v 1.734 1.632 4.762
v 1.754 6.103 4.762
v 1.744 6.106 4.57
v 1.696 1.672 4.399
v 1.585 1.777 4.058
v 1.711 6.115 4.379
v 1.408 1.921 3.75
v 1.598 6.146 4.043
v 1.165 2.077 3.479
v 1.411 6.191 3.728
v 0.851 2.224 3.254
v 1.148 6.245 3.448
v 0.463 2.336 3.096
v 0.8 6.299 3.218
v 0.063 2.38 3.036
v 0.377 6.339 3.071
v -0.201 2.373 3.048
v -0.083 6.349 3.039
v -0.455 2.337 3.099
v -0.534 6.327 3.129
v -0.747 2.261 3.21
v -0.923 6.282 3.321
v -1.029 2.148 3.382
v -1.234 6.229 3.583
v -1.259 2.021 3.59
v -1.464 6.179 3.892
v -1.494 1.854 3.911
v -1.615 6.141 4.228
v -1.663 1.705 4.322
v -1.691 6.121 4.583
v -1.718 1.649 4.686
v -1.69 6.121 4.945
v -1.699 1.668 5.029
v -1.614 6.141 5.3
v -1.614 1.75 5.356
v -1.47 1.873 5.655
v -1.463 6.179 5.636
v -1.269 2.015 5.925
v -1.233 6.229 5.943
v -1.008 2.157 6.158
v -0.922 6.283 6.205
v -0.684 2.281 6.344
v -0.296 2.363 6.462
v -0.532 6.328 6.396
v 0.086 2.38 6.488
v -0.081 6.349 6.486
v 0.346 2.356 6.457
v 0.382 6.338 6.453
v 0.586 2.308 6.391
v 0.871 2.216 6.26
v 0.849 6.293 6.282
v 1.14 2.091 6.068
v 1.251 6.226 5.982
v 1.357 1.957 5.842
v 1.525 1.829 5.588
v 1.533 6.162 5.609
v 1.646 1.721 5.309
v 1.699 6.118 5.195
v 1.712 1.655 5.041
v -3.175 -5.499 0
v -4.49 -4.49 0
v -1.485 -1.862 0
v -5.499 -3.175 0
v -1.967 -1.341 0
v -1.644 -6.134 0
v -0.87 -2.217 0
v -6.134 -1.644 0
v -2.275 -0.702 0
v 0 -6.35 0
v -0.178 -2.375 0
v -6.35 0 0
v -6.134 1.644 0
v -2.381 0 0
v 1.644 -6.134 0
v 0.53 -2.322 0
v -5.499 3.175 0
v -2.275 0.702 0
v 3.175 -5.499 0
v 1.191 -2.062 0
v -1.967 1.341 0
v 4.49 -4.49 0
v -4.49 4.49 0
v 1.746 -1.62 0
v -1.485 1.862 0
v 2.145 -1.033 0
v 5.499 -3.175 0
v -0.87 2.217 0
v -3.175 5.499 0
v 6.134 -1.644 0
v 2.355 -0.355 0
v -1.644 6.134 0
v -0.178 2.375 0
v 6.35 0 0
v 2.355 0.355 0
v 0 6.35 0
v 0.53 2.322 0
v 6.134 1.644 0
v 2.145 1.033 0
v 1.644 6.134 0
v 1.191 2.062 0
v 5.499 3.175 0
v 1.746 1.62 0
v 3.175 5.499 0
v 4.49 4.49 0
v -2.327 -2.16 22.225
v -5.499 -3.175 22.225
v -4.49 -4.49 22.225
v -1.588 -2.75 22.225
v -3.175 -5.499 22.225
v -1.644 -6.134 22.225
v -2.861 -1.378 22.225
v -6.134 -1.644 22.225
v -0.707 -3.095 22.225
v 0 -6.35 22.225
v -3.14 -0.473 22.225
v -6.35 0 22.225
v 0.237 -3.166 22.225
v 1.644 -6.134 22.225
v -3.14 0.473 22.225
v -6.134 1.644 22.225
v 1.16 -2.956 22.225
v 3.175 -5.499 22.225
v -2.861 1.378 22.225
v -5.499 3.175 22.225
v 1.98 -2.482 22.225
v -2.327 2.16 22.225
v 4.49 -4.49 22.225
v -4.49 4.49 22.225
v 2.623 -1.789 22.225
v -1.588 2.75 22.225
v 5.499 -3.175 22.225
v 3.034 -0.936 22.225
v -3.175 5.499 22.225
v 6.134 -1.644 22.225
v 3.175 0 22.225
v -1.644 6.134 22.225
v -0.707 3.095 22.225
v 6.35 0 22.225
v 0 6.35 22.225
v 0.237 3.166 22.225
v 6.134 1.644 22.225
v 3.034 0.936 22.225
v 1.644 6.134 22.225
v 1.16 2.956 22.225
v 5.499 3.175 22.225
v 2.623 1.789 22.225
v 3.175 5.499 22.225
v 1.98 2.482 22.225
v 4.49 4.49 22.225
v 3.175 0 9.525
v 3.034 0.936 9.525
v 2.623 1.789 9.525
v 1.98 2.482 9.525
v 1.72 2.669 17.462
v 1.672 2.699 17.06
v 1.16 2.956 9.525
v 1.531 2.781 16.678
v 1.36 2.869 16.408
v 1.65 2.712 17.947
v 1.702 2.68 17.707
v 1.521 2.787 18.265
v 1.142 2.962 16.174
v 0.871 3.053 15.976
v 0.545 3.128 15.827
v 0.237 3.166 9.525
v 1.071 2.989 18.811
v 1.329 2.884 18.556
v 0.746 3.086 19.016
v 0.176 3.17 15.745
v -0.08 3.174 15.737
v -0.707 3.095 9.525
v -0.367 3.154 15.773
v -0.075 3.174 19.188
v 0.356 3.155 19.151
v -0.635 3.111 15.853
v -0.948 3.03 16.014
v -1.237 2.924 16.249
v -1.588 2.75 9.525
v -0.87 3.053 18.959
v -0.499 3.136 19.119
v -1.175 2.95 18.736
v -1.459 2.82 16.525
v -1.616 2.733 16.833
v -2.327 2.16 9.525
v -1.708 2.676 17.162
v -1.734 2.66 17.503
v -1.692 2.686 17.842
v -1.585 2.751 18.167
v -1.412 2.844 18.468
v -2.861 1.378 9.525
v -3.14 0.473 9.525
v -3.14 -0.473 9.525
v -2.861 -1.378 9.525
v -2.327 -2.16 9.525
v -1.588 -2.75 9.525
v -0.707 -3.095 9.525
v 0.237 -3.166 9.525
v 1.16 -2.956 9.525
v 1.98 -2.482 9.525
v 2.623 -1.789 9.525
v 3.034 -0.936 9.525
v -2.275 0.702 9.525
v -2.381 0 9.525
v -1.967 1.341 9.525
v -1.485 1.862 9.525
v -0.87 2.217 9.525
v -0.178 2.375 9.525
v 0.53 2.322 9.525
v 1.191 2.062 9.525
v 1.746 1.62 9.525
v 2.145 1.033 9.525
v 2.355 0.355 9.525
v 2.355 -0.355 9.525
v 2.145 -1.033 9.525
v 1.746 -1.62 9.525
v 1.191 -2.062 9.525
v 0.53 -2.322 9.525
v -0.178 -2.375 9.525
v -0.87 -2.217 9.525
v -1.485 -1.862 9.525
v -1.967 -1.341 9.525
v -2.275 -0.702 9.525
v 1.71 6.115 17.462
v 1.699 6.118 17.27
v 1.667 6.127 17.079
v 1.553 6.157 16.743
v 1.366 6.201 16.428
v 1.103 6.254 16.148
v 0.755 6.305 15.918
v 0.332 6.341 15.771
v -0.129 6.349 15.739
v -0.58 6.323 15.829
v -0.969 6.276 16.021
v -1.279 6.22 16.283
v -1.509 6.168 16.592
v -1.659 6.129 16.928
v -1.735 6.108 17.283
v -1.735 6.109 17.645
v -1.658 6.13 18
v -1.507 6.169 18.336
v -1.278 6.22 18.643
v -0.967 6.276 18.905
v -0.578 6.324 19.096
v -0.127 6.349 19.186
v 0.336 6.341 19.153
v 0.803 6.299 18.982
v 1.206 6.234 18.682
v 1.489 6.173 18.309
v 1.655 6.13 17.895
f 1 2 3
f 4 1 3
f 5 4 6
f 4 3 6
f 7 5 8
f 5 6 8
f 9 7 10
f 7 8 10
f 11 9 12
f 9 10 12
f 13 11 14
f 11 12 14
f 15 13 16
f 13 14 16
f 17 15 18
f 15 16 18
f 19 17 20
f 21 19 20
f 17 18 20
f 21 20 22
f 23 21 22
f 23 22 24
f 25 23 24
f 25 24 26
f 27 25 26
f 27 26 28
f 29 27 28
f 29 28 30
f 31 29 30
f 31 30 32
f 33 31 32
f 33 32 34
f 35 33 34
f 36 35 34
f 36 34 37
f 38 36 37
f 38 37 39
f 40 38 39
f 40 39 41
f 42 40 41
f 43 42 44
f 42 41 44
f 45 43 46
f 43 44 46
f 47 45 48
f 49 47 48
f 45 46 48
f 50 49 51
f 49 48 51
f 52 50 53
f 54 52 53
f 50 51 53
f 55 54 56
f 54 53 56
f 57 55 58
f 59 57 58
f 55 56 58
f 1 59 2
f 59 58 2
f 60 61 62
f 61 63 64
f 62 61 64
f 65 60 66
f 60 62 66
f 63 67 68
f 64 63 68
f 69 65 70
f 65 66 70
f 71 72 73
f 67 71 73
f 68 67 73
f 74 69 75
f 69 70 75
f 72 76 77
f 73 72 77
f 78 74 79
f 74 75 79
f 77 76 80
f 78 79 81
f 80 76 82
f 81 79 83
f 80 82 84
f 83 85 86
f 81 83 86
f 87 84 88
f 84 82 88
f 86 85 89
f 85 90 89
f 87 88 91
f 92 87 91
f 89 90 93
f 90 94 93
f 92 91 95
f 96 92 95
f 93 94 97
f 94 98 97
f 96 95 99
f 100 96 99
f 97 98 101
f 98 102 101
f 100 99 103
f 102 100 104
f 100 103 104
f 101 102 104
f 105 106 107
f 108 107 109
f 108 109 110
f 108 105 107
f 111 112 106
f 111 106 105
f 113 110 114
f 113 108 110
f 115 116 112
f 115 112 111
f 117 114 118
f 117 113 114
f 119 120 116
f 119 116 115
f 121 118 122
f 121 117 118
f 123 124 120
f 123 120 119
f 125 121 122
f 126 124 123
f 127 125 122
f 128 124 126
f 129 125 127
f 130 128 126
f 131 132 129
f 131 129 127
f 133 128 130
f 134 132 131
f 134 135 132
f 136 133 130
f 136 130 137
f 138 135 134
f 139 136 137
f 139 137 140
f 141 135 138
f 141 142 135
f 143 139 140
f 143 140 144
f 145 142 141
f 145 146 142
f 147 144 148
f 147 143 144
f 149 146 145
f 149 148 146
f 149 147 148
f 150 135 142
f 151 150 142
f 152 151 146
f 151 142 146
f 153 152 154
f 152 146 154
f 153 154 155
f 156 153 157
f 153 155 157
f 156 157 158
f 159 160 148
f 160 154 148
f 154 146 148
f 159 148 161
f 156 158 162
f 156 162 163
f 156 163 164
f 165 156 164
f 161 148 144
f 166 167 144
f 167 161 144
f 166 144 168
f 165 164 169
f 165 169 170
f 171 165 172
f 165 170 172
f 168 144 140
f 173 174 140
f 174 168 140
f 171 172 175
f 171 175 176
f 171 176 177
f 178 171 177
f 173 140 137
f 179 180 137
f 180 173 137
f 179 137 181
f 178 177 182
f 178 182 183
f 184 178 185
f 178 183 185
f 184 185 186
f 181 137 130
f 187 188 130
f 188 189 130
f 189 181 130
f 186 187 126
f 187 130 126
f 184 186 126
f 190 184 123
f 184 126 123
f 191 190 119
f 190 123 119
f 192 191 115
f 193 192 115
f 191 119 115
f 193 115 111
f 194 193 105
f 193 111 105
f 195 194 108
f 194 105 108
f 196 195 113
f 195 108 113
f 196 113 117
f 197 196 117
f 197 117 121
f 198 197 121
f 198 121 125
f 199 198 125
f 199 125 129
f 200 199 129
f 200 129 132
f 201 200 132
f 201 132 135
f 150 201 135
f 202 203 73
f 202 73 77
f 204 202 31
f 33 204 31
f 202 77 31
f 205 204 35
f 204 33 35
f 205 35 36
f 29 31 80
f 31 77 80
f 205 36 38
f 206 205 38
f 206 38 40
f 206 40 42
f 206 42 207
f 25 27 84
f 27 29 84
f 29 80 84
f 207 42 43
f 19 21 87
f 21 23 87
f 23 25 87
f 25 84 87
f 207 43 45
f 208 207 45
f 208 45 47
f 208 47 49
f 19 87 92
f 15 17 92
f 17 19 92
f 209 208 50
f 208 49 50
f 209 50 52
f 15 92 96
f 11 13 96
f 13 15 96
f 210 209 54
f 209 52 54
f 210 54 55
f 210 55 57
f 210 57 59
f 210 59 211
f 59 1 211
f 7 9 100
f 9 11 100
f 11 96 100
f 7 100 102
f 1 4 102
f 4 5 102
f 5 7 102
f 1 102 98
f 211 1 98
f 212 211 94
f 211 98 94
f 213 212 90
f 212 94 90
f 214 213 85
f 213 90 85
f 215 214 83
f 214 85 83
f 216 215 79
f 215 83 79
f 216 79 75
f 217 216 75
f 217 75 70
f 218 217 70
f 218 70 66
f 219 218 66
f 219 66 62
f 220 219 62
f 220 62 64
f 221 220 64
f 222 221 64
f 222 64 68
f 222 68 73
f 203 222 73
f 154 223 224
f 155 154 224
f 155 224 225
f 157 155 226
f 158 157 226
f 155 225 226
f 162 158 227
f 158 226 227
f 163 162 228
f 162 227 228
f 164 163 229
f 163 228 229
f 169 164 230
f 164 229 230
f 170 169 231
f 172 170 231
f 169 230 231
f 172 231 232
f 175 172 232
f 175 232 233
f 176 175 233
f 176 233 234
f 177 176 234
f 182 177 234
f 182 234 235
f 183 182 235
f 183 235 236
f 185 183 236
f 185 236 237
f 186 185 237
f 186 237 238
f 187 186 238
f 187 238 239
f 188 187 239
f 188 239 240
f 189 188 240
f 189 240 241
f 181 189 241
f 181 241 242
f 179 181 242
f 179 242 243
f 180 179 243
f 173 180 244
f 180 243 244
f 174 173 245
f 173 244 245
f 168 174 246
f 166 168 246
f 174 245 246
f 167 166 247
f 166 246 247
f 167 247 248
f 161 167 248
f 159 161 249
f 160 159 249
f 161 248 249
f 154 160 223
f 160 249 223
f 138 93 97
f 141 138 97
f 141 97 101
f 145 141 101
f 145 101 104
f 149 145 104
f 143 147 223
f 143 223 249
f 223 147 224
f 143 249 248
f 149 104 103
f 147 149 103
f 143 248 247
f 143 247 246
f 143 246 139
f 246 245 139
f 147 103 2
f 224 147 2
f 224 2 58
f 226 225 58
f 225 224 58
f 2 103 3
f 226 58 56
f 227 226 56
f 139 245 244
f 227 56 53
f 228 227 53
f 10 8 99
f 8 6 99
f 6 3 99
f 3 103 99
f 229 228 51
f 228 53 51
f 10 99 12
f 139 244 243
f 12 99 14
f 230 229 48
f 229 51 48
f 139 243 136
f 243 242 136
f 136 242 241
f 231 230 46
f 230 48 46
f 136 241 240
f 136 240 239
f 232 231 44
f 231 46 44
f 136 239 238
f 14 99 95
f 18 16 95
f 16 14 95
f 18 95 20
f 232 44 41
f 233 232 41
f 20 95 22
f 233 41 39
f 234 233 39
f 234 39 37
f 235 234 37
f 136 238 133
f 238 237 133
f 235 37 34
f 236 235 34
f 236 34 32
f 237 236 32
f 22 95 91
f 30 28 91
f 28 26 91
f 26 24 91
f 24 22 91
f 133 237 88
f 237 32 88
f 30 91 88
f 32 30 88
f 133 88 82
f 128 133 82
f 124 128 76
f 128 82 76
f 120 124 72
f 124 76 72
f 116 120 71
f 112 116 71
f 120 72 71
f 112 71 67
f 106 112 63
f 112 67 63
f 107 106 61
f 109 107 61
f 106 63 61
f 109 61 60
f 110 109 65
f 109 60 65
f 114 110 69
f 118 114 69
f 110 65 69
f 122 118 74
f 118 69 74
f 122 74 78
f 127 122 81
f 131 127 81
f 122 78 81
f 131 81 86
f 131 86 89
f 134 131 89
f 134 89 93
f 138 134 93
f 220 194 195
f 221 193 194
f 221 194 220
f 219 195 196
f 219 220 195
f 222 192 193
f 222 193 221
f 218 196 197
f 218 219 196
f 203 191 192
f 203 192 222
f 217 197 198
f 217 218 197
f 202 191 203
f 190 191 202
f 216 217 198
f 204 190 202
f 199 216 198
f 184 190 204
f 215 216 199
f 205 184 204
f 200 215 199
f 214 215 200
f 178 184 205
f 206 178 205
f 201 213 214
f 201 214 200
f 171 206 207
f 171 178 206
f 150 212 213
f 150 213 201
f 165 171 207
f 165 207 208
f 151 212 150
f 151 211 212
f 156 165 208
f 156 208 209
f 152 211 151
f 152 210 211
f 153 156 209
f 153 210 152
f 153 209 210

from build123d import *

# Parameters (mm, degrees)
SKETCH1_R                           = 6.35
BOSS_EXTRUDE1_DEPTH                 = 22.225
SKETCH2_R                           = 3.175
THICK_DEPTH                         = 12.7
SKETCH3_R                           = 2.38125
THIN_DEPTH                          = 12.7
F_8_32_TAPPED_HOLE2_REACH           = 24.512
F_8_32_TAPPED_HOLE2_BORE_R          = 1.7272
F_8_32_TAPPED_HOLE2_ON_FACE_2_REACH = 24.515
F_8_32_TAPPED_HOLE2_BORE_2_R        = 1.7272


with BuildPart() as part:
    # Sketch1 → Boss-Extrude1 (new body)
    with BuildSketch(Plane.XY):
        Circle(SKETCH1_R)
    extrude(amount=BOSS_EXTRUDE1_DEPTH)

    # Sketch2 → Thick (cut)
    with BuildSketch(Plane.XY.offset(22.225)):
        Circle(SKETCH2_R)
    extrude(amount=-THICK_DEPTH, mode=Mode.SUBTRACT)

    # Sketch3 → Thin (cut)
    with BuildSketch(Plane(origin=(0, 0, 0), x_dir=(-1, 0, 0), z_dir=(0, 0, -1))):
        Circle(SKETCH3_R)
    extrude(amount=-THIN_DEPTH, mode=Mode.SUBTRACT)

    # #8-32 Tapped Hole2 bore (on position points) → #8-32 Tapped Hole2 (cut, up to next)
    with BuildSketch(Plane(origin=(-0.017626293, 6.349975536, 17.4625), x_dir=(0.999996147476, 0.002775794184, 0), z_dir=(-0.002775794184, 0.999996147476, 0)), mode=Mode.PRIVATE) as f_8_32_tapped_hole2_sk1:
        Circle(F_8_32_TAPPED_HOLE2_BORE_R)
    f_8_32_tapped_hole2_tool1 = extrude(f_8_32_tapped_hole2_sk1.sketch, amount=-F_8_32_TAPPED_HOLE2_REACH, mode=Mode.PRIVATE) & part.part
    add(f_8_32_tapped_hole2_tool1.solids().sort_by_distance((-0.017626, 6.349976, 17.4625))[0], mode=Mode.SUBTRACT)

    # #8-32 Tapped Hole2 bore 2 (on position points) → #8-32 Tapped Hole2 on face 2 (cut, up to next)
    with BuildSketch(Plane(origin=(0.028231467, 6.349937243, 4.7625), x_dir=(0.999990116491, -0.004446000518, 0), z_dir=(0.004446000518, 0.999990116491, 0)), mode=Mode.PRIVATE) as f_8_32_tapped_hole2_on_face_2_sk1:
        Circle(F_8_32_TAPPED_HOLE2_BORE_2_R)
    f_8_32_tapped_hole2_on_face_2_tool1 = extrude(f_8_32_tapped_hole2_on_face_2_sk1.sketch, amount=-F_8_32_TAPPED_HOLE2_ON_FACE_2_REACH, mode=Mode.PRIVATE) & part.part
    add(f_8_32_tapped_hole2_on_face_2_tool1.solids().sort_by_distance((0.028231, 6.349937, 4.7625))[0], mode=Mode.SUBTRACT)


solid = part.part
